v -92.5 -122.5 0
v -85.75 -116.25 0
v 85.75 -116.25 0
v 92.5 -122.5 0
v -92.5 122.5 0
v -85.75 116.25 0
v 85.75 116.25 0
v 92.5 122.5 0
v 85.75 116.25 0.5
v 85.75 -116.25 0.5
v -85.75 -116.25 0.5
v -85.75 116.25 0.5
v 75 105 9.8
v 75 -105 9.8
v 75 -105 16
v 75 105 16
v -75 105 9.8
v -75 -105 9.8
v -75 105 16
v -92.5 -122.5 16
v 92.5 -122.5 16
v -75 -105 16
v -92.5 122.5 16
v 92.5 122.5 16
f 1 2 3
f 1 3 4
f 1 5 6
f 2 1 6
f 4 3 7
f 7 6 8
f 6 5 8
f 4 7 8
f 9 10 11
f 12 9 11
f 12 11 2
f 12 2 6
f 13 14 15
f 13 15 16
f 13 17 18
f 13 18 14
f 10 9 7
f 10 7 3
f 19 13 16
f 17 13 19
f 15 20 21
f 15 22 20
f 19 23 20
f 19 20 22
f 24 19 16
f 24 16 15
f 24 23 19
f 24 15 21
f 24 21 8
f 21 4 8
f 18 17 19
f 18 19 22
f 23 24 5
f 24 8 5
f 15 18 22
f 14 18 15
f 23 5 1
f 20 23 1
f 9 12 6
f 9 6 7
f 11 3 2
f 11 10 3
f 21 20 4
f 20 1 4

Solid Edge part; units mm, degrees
sketch "Sketch1" plane through (0, 0, 0) normal (0, 0, 1) x (1, 0, 0)
  line L0 (92.5, 122.5) -> (-92.5, 122.5)
  line L1 (-92.5, 122.5) -> (-92.5, -122.5)
  line L2 (-92.5, -122.5) -> (92.5, -122.5)
  line L3 (92.5, -122.5) -> (92.5, 122.5)
extrude "Protrusion1" add sketch "Sketch1" along normal blind 16
sketch "Sketch2" plane through (0, 0, 0) normal (0, 0, -1) x (-1, 0, 0)
  line L0 (-85.75, 116.25) -> (-85.75, -116.25)
  line L1 (-85.75, -116.25) -> (85.75, -116.25)
  line L2 (85.75, -116.25) -> (85.75, 116.25)
  line L3 (85.75, 116.25) -> (-85.75, 116.25)
extrude "Wycięcie_1" cut sketch "Sketch2" along normal mid plane 1
sketch "Sketch3" plane through (0, 0, 16) normal (0, 0, 1) x (1, 0, 0)
  line L0 (75, 105) -> (-75, 105)
  line L1 (-75, 105) -> (-75, -105)
  line L2 (-75, -105) -> (75, -105)
  line L3 (75, -105) -> (75, 105)
extrude "Wycięcie_2" cut sketch "Sketch3" along normal mid plane 12.4
properties material "Aluminium, 1060"
